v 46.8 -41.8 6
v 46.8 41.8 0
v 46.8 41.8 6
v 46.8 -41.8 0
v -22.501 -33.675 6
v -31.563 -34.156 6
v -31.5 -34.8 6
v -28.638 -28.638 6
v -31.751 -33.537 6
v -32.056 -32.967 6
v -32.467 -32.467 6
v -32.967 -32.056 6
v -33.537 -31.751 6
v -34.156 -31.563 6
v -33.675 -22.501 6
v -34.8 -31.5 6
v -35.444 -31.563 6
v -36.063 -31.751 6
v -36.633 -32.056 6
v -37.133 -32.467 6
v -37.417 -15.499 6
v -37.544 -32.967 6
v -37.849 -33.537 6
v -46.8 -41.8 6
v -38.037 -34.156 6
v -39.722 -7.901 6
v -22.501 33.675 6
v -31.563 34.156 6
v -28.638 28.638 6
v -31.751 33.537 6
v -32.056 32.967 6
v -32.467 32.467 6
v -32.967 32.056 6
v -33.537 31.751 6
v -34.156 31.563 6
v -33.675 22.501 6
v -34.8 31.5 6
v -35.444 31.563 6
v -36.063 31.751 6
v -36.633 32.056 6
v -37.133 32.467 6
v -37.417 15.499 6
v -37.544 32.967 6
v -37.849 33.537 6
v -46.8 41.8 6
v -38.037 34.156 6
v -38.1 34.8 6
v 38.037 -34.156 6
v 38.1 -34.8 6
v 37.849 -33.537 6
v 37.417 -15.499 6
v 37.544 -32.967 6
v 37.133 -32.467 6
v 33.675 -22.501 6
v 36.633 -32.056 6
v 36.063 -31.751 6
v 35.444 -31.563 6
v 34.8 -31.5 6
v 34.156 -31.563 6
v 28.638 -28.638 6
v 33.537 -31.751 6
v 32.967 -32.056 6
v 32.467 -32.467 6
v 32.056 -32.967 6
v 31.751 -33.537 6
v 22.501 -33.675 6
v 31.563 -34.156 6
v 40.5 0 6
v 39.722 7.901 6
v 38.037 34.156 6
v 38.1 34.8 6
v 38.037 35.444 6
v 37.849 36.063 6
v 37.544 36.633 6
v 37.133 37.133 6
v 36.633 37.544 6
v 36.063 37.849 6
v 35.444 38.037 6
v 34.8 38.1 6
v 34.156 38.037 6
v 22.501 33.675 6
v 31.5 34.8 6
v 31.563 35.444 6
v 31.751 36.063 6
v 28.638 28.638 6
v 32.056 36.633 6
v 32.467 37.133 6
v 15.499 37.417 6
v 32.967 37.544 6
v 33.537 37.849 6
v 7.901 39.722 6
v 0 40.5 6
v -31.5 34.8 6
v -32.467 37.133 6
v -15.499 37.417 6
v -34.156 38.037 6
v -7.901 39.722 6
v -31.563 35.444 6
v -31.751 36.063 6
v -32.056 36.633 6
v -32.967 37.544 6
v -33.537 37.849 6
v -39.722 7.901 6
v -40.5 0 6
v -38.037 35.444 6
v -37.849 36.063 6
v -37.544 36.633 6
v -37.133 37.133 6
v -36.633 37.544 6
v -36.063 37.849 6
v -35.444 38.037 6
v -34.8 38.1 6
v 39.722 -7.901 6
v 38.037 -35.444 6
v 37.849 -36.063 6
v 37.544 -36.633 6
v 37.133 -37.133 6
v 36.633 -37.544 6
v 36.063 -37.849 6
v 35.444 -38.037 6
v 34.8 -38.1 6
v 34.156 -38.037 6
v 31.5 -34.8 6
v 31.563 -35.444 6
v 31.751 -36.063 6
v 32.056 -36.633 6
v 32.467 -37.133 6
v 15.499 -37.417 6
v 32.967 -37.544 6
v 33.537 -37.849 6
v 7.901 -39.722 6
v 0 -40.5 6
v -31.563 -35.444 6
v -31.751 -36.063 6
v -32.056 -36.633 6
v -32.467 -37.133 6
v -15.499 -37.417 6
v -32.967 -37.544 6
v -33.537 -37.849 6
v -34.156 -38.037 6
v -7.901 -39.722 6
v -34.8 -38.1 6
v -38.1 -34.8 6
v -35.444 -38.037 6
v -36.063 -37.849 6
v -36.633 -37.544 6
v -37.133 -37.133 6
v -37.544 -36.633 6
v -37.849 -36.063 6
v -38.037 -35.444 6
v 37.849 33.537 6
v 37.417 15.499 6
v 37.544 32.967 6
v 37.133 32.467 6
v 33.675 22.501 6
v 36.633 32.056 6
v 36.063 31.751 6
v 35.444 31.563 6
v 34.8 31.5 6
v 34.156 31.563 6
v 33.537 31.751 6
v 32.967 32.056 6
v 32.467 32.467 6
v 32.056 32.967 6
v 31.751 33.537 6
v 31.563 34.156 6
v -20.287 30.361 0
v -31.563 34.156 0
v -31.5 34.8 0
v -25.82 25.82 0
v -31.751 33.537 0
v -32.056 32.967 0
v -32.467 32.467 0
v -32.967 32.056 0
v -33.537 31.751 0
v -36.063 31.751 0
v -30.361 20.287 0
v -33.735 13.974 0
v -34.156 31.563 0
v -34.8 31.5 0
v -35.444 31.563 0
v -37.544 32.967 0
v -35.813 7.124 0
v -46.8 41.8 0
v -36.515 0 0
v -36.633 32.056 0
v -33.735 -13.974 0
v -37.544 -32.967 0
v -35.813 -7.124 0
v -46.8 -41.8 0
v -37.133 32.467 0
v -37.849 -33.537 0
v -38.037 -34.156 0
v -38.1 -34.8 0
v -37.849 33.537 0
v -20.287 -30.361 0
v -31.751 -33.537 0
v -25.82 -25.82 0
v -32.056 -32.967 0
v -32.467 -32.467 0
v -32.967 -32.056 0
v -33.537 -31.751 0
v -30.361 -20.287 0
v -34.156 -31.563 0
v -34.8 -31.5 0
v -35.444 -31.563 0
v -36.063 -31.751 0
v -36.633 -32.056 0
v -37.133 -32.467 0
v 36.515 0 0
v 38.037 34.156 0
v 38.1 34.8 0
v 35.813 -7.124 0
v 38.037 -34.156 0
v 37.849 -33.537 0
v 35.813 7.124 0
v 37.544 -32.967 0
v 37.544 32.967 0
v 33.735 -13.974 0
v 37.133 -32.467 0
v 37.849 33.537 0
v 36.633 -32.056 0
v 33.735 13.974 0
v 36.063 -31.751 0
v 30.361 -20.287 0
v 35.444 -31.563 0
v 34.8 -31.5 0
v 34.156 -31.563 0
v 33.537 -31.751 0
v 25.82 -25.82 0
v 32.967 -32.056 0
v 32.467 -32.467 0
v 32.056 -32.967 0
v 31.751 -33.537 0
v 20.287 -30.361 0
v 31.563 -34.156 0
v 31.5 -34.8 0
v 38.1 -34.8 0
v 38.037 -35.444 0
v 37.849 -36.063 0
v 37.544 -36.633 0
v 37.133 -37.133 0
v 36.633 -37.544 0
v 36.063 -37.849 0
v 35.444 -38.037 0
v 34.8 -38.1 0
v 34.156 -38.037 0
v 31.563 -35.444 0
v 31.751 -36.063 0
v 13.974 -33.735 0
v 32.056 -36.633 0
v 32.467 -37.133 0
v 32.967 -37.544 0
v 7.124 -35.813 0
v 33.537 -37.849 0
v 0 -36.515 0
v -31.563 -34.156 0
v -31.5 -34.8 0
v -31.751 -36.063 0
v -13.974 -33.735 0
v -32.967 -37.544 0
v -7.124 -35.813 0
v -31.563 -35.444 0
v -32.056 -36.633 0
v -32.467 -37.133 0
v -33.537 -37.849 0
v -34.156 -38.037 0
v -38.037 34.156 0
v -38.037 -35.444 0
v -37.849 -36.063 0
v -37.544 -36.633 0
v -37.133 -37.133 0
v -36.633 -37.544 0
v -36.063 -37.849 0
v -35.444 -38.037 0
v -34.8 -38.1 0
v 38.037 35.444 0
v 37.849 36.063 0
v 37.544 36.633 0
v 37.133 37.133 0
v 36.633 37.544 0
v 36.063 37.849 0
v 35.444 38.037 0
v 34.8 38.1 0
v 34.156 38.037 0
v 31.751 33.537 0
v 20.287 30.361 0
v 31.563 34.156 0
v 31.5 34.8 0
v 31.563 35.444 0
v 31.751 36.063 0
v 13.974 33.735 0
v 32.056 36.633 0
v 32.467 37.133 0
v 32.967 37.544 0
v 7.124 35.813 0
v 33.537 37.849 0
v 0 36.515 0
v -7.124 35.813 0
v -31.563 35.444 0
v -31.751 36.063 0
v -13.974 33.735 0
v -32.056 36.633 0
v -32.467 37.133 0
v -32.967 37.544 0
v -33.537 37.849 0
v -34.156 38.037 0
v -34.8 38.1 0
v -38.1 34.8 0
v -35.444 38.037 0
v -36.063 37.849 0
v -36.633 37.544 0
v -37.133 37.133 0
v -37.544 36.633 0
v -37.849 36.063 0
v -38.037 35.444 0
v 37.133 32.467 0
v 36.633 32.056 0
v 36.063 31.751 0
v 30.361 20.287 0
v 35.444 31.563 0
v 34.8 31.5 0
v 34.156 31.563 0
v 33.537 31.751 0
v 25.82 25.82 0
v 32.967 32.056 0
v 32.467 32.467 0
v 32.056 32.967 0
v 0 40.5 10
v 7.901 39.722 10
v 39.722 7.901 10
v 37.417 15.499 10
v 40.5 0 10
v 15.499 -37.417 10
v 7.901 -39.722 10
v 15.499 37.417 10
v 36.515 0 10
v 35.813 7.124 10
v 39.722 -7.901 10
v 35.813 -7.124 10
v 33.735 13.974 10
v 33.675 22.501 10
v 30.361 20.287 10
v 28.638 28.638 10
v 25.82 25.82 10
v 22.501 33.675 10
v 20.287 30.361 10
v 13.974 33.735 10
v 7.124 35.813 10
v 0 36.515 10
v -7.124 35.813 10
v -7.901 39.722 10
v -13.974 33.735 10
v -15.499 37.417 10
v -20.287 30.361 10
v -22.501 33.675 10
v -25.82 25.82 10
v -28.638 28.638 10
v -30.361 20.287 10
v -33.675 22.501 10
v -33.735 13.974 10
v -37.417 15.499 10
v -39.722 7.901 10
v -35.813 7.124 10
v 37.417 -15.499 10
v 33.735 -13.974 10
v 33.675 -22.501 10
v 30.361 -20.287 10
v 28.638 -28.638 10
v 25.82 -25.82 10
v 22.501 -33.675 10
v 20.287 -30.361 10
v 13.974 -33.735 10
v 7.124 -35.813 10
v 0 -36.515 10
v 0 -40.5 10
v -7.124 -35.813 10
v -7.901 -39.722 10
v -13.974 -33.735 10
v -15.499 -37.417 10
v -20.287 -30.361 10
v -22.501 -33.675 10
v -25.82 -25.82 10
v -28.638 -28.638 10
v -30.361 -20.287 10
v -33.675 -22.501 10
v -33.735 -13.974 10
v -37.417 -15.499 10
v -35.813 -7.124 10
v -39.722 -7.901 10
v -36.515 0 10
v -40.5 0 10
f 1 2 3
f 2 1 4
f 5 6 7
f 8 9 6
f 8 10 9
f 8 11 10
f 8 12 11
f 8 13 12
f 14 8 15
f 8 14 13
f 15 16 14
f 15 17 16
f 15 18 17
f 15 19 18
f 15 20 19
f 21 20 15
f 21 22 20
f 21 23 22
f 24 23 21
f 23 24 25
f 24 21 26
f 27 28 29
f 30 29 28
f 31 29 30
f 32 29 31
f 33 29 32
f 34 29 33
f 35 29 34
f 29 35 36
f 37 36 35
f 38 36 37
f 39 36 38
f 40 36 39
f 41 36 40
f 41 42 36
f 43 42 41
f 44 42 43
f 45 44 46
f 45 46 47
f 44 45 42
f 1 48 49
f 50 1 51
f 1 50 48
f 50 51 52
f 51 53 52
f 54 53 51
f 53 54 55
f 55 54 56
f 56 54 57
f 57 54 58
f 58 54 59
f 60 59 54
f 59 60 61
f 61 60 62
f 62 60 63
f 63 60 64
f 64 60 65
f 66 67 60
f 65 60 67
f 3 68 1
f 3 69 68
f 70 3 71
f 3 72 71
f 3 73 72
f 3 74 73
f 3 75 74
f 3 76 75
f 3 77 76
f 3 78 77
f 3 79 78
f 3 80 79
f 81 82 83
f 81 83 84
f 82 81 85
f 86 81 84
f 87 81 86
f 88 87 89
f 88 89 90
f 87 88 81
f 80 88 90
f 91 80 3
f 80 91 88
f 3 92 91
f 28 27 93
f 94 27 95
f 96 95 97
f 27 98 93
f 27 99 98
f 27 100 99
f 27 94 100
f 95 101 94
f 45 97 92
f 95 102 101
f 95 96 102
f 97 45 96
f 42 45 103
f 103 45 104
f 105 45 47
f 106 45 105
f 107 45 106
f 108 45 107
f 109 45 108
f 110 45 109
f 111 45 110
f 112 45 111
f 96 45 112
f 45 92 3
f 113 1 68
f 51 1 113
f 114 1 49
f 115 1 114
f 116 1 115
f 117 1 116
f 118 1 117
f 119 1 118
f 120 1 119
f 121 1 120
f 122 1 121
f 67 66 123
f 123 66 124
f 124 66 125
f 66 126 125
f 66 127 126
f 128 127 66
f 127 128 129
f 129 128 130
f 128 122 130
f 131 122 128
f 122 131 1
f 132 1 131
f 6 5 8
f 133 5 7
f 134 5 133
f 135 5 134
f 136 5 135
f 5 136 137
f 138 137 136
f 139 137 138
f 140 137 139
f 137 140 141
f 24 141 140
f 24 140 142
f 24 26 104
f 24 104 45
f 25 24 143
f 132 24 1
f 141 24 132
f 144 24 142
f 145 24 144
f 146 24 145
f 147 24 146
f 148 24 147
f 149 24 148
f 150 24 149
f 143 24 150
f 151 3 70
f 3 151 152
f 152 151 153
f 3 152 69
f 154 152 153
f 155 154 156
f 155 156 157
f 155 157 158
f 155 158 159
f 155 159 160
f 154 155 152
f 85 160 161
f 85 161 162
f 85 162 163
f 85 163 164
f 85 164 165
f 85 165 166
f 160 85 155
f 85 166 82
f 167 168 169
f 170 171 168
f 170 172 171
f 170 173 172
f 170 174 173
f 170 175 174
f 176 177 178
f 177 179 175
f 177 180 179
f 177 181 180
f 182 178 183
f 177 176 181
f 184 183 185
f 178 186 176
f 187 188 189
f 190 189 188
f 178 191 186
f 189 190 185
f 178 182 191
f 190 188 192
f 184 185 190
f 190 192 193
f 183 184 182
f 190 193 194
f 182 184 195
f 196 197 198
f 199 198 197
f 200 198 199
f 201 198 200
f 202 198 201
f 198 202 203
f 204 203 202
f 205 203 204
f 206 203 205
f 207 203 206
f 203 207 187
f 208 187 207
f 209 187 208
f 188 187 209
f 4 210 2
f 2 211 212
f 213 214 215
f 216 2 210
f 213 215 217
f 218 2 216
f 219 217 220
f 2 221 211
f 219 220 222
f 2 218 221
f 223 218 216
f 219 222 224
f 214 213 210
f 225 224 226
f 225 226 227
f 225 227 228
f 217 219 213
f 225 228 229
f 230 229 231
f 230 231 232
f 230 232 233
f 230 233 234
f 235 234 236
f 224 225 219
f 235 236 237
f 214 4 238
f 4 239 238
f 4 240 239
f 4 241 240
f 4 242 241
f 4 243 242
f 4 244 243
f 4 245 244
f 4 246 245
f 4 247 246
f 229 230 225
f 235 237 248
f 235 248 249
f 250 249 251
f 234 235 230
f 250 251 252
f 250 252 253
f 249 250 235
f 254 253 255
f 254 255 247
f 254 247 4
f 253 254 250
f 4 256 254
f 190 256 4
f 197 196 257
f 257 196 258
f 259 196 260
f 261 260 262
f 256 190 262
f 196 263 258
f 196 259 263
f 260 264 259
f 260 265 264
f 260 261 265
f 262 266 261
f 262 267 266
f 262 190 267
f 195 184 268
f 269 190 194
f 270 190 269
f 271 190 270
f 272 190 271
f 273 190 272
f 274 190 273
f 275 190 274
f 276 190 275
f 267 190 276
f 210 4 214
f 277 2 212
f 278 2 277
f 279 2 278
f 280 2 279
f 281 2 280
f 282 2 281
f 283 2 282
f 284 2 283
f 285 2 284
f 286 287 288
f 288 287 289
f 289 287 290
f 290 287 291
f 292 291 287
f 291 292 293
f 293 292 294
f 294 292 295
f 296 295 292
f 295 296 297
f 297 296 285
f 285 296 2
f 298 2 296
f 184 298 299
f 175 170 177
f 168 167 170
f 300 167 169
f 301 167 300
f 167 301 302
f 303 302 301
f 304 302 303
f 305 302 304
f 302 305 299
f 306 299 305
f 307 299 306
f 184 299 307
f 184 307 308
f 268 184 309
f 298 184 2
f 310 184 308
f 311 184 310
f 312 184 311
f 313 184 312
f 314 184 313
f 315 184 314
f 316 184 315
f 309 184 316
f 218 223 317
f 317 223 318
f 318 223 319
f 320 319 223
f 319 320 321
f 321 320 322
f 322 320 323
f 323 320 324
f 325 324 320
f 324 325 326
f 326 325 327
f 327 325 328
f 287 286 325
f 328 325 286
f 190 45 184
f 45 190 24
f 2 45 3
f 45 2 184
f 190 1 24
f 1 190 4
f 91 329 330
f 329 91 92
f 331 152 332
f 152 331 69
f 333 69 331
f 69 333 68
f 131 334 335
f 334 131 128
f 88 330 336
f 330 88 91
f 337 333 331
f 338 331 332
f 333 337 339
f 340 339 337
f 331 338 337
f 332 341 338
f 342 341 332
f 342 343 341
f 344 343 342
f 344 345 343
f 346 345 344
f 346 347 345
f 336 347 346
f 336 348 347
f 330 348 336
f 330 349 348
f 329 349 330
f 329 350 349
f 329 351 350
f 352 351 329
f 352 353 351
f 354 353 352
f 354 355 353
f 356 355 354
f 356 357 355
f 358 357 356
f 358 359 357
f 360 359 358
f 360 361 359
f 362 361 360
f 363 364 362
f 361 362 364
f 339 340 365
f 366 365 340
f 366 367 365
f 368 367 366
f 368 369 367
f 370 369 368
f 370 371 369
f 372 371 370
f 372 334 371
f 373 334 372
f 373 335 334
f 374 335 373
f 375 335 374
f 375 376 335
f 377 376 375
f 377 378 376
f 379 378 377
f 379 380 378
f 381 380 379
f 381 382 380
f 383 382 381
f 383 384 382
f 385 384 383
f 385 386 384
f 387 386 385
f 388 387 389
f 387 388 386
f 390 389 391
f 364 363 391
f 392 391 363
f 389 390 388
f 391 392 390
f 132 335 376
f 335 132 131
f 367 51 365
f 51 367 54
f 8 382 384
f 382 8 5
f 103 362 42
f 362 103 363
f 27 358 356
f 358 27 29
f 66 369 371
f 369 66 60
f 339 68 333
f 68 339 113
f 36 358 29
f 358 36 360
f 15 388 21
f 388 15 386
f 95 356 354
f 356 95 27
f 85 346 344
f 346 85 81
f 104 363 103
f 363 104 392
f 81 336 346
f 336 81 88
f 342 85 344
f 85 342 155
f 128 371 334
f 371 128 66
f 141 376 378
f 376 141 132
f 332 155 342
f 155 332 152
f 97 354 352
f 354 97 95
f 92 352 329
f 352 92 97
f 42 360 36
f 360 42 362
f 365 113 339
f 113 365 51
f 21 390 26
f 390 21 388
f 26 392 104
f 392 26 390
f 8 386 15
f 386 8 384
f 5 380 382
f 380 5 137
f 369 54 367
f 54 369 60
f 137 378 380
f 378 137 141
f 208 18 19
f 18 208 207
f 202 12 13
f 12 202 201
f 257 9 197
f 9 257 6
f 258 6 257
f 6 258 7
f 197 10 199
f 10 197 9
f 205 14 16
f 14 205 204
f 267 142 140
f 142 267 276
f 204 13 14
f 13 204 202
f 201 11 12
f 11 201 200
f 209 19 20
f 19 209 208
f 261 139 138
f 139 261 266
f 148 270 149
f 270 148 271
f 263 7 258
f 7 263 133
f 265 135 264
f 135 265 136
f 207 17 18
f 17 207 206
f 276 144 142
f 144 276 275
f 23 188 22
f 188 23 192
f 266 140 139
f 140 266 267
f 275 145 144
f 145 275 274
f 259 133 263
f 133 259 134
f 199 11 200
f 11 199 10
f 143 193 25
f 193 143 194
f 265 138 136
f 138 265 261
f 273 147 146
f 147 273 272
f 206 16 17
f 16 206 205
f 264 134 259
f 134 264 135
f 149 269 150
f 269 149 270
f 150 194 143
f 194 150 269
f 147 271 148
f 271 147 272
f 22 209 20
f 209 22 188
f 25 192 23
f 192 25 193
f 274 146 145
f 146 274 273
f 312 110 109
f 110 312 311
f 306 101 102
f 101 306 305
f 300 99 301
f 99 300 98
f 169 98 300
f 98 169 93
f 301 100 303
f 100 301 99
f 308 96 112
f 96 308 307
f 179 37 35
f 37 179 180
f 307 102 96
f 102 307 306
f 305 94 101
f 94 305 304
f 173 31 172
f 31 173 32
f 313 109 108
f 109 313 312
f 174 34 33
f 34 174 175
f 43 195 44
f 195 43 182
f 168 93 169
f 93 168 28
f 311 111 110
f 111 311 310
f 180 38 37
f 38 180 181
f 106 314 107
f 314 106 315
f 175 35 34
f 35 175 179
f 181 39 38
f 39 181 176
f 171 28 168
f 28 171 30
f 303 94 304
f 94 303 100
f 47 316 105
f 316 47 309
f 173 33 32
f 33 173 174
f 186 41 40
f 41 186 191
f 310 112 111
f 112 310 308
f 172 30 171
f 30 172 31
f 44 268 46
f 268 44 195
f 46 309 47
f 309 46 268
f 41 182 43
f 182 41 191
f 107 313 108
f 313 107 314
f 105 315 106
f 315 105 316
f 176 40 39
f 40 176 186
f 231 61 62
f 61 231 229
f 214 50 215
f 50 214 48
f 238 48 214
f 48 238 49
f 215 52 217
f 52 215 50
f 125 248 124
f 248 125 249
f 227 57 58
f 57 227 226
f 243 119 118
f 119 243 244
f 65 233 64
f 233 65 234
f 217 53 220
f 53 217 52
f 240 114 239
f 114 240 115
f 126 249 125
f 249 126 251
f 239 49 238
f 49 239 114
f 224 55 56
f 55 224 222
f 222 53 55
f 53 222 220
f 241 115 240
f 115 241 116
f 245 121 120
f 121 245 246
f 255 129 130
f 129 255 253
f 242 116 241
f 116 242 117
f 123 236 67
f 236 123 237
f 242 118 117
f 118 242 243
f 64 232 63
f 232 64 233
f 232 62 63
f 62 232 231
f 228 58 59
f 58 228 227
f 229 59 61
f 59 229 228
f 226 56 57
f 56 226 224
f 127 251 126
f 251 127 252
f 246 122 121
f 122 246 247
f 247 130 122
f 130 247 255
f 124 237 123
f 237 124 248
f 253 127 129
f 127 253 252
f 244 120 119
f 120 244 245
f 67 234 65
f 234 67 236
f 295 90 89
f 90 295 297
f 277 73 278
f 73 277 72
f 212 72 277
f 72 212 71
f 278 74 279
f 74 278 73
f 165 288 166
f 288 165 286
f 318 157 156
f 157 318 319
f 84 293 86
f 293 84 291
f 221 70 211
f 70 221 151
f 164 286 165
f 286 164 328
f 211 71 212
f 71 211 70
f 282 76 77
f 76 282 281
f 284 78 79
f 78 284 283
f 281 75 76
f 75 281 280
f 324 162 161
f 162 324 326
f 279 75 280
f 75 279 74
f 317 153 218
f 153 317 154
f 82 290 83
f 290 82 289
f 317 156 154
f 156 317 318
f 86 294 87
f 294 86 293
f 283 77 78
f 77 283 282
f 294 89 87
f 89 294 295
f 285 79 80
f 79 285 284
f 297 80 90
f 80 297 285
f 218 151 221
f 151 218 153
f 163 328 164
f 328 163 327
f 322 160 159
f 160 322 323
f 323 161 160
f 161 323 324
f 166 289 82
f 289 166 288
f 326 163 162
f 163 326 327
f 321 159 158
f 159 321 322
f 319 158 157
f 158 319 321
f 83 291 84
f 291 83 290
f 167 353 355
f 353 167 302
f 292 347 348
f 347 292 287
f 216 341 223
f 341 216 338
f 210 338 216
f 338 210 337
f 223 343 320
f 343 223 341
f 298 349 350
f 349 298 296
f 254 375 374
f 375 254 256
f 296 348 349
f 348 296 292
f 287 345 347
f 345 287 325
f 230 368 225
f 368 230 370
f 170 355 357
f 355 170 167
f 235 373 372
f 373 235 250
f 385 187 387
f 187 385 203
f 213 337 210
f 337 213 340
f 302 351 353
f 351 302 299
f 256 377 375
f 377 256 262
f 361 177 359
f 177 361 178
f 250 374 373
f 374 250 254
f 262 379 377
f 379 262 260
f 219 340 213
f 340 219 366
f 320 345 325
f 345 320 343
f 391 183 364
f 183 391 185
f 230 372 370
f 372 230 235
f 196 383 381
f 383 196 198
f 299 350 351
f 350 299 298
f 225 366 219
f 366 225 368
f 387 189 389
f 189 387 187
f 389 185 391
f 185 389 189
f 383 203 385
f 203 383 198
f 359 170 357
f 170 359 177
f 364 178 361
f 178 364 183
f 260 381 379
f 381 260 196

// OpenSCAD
$fn = 32;

// ----------------------------------------------------------------------
// Motor mount plate: NEMA34, 93.6 x 83.6 x 10 mm
// ----------------------------------------------------------------------

// --- parameters (mm) ---
mount_w = 93.6;           // plate length, X
mount_d = 83.6;           // plate width, Y
mat_t = 6;                // plate thickness
motor_pitch = 69.6;       // NEMA34 bolt spacing
motor_d = 6.6;            // NEMA34 screw clearance
center_bore = 73.03;      // pilot boss bore
boss_d = 81;              // raised pilot ring
boss_h = 4;               // raised pilot ring height

module plate() {
  translate([-mount_w / 2, -mount_d / 2, 0]) cube([mount_w, mount_d, mat_t]);
}

module motor_holes() {
  for (sx = [-1, 1]) for (sy = [-1, 1])
    translate([sx * motor_pitch / 2, sy * motor_pitch / 2, -1])
      cylinder(h = mat_t + 2, d = motor_d);
}
module pilot_ring() {
  translate([0, 0, mat_t - 1]) cylinder(h = boss_h + 1, d = boss_d);
}

difference() {
  union() {
    plate();
    pilot_ring();
  }
  motor_holes();
  translate([0, 0, -1]) cylinder(h = mat_t + boss_h + 2, d = center_bore);
}
